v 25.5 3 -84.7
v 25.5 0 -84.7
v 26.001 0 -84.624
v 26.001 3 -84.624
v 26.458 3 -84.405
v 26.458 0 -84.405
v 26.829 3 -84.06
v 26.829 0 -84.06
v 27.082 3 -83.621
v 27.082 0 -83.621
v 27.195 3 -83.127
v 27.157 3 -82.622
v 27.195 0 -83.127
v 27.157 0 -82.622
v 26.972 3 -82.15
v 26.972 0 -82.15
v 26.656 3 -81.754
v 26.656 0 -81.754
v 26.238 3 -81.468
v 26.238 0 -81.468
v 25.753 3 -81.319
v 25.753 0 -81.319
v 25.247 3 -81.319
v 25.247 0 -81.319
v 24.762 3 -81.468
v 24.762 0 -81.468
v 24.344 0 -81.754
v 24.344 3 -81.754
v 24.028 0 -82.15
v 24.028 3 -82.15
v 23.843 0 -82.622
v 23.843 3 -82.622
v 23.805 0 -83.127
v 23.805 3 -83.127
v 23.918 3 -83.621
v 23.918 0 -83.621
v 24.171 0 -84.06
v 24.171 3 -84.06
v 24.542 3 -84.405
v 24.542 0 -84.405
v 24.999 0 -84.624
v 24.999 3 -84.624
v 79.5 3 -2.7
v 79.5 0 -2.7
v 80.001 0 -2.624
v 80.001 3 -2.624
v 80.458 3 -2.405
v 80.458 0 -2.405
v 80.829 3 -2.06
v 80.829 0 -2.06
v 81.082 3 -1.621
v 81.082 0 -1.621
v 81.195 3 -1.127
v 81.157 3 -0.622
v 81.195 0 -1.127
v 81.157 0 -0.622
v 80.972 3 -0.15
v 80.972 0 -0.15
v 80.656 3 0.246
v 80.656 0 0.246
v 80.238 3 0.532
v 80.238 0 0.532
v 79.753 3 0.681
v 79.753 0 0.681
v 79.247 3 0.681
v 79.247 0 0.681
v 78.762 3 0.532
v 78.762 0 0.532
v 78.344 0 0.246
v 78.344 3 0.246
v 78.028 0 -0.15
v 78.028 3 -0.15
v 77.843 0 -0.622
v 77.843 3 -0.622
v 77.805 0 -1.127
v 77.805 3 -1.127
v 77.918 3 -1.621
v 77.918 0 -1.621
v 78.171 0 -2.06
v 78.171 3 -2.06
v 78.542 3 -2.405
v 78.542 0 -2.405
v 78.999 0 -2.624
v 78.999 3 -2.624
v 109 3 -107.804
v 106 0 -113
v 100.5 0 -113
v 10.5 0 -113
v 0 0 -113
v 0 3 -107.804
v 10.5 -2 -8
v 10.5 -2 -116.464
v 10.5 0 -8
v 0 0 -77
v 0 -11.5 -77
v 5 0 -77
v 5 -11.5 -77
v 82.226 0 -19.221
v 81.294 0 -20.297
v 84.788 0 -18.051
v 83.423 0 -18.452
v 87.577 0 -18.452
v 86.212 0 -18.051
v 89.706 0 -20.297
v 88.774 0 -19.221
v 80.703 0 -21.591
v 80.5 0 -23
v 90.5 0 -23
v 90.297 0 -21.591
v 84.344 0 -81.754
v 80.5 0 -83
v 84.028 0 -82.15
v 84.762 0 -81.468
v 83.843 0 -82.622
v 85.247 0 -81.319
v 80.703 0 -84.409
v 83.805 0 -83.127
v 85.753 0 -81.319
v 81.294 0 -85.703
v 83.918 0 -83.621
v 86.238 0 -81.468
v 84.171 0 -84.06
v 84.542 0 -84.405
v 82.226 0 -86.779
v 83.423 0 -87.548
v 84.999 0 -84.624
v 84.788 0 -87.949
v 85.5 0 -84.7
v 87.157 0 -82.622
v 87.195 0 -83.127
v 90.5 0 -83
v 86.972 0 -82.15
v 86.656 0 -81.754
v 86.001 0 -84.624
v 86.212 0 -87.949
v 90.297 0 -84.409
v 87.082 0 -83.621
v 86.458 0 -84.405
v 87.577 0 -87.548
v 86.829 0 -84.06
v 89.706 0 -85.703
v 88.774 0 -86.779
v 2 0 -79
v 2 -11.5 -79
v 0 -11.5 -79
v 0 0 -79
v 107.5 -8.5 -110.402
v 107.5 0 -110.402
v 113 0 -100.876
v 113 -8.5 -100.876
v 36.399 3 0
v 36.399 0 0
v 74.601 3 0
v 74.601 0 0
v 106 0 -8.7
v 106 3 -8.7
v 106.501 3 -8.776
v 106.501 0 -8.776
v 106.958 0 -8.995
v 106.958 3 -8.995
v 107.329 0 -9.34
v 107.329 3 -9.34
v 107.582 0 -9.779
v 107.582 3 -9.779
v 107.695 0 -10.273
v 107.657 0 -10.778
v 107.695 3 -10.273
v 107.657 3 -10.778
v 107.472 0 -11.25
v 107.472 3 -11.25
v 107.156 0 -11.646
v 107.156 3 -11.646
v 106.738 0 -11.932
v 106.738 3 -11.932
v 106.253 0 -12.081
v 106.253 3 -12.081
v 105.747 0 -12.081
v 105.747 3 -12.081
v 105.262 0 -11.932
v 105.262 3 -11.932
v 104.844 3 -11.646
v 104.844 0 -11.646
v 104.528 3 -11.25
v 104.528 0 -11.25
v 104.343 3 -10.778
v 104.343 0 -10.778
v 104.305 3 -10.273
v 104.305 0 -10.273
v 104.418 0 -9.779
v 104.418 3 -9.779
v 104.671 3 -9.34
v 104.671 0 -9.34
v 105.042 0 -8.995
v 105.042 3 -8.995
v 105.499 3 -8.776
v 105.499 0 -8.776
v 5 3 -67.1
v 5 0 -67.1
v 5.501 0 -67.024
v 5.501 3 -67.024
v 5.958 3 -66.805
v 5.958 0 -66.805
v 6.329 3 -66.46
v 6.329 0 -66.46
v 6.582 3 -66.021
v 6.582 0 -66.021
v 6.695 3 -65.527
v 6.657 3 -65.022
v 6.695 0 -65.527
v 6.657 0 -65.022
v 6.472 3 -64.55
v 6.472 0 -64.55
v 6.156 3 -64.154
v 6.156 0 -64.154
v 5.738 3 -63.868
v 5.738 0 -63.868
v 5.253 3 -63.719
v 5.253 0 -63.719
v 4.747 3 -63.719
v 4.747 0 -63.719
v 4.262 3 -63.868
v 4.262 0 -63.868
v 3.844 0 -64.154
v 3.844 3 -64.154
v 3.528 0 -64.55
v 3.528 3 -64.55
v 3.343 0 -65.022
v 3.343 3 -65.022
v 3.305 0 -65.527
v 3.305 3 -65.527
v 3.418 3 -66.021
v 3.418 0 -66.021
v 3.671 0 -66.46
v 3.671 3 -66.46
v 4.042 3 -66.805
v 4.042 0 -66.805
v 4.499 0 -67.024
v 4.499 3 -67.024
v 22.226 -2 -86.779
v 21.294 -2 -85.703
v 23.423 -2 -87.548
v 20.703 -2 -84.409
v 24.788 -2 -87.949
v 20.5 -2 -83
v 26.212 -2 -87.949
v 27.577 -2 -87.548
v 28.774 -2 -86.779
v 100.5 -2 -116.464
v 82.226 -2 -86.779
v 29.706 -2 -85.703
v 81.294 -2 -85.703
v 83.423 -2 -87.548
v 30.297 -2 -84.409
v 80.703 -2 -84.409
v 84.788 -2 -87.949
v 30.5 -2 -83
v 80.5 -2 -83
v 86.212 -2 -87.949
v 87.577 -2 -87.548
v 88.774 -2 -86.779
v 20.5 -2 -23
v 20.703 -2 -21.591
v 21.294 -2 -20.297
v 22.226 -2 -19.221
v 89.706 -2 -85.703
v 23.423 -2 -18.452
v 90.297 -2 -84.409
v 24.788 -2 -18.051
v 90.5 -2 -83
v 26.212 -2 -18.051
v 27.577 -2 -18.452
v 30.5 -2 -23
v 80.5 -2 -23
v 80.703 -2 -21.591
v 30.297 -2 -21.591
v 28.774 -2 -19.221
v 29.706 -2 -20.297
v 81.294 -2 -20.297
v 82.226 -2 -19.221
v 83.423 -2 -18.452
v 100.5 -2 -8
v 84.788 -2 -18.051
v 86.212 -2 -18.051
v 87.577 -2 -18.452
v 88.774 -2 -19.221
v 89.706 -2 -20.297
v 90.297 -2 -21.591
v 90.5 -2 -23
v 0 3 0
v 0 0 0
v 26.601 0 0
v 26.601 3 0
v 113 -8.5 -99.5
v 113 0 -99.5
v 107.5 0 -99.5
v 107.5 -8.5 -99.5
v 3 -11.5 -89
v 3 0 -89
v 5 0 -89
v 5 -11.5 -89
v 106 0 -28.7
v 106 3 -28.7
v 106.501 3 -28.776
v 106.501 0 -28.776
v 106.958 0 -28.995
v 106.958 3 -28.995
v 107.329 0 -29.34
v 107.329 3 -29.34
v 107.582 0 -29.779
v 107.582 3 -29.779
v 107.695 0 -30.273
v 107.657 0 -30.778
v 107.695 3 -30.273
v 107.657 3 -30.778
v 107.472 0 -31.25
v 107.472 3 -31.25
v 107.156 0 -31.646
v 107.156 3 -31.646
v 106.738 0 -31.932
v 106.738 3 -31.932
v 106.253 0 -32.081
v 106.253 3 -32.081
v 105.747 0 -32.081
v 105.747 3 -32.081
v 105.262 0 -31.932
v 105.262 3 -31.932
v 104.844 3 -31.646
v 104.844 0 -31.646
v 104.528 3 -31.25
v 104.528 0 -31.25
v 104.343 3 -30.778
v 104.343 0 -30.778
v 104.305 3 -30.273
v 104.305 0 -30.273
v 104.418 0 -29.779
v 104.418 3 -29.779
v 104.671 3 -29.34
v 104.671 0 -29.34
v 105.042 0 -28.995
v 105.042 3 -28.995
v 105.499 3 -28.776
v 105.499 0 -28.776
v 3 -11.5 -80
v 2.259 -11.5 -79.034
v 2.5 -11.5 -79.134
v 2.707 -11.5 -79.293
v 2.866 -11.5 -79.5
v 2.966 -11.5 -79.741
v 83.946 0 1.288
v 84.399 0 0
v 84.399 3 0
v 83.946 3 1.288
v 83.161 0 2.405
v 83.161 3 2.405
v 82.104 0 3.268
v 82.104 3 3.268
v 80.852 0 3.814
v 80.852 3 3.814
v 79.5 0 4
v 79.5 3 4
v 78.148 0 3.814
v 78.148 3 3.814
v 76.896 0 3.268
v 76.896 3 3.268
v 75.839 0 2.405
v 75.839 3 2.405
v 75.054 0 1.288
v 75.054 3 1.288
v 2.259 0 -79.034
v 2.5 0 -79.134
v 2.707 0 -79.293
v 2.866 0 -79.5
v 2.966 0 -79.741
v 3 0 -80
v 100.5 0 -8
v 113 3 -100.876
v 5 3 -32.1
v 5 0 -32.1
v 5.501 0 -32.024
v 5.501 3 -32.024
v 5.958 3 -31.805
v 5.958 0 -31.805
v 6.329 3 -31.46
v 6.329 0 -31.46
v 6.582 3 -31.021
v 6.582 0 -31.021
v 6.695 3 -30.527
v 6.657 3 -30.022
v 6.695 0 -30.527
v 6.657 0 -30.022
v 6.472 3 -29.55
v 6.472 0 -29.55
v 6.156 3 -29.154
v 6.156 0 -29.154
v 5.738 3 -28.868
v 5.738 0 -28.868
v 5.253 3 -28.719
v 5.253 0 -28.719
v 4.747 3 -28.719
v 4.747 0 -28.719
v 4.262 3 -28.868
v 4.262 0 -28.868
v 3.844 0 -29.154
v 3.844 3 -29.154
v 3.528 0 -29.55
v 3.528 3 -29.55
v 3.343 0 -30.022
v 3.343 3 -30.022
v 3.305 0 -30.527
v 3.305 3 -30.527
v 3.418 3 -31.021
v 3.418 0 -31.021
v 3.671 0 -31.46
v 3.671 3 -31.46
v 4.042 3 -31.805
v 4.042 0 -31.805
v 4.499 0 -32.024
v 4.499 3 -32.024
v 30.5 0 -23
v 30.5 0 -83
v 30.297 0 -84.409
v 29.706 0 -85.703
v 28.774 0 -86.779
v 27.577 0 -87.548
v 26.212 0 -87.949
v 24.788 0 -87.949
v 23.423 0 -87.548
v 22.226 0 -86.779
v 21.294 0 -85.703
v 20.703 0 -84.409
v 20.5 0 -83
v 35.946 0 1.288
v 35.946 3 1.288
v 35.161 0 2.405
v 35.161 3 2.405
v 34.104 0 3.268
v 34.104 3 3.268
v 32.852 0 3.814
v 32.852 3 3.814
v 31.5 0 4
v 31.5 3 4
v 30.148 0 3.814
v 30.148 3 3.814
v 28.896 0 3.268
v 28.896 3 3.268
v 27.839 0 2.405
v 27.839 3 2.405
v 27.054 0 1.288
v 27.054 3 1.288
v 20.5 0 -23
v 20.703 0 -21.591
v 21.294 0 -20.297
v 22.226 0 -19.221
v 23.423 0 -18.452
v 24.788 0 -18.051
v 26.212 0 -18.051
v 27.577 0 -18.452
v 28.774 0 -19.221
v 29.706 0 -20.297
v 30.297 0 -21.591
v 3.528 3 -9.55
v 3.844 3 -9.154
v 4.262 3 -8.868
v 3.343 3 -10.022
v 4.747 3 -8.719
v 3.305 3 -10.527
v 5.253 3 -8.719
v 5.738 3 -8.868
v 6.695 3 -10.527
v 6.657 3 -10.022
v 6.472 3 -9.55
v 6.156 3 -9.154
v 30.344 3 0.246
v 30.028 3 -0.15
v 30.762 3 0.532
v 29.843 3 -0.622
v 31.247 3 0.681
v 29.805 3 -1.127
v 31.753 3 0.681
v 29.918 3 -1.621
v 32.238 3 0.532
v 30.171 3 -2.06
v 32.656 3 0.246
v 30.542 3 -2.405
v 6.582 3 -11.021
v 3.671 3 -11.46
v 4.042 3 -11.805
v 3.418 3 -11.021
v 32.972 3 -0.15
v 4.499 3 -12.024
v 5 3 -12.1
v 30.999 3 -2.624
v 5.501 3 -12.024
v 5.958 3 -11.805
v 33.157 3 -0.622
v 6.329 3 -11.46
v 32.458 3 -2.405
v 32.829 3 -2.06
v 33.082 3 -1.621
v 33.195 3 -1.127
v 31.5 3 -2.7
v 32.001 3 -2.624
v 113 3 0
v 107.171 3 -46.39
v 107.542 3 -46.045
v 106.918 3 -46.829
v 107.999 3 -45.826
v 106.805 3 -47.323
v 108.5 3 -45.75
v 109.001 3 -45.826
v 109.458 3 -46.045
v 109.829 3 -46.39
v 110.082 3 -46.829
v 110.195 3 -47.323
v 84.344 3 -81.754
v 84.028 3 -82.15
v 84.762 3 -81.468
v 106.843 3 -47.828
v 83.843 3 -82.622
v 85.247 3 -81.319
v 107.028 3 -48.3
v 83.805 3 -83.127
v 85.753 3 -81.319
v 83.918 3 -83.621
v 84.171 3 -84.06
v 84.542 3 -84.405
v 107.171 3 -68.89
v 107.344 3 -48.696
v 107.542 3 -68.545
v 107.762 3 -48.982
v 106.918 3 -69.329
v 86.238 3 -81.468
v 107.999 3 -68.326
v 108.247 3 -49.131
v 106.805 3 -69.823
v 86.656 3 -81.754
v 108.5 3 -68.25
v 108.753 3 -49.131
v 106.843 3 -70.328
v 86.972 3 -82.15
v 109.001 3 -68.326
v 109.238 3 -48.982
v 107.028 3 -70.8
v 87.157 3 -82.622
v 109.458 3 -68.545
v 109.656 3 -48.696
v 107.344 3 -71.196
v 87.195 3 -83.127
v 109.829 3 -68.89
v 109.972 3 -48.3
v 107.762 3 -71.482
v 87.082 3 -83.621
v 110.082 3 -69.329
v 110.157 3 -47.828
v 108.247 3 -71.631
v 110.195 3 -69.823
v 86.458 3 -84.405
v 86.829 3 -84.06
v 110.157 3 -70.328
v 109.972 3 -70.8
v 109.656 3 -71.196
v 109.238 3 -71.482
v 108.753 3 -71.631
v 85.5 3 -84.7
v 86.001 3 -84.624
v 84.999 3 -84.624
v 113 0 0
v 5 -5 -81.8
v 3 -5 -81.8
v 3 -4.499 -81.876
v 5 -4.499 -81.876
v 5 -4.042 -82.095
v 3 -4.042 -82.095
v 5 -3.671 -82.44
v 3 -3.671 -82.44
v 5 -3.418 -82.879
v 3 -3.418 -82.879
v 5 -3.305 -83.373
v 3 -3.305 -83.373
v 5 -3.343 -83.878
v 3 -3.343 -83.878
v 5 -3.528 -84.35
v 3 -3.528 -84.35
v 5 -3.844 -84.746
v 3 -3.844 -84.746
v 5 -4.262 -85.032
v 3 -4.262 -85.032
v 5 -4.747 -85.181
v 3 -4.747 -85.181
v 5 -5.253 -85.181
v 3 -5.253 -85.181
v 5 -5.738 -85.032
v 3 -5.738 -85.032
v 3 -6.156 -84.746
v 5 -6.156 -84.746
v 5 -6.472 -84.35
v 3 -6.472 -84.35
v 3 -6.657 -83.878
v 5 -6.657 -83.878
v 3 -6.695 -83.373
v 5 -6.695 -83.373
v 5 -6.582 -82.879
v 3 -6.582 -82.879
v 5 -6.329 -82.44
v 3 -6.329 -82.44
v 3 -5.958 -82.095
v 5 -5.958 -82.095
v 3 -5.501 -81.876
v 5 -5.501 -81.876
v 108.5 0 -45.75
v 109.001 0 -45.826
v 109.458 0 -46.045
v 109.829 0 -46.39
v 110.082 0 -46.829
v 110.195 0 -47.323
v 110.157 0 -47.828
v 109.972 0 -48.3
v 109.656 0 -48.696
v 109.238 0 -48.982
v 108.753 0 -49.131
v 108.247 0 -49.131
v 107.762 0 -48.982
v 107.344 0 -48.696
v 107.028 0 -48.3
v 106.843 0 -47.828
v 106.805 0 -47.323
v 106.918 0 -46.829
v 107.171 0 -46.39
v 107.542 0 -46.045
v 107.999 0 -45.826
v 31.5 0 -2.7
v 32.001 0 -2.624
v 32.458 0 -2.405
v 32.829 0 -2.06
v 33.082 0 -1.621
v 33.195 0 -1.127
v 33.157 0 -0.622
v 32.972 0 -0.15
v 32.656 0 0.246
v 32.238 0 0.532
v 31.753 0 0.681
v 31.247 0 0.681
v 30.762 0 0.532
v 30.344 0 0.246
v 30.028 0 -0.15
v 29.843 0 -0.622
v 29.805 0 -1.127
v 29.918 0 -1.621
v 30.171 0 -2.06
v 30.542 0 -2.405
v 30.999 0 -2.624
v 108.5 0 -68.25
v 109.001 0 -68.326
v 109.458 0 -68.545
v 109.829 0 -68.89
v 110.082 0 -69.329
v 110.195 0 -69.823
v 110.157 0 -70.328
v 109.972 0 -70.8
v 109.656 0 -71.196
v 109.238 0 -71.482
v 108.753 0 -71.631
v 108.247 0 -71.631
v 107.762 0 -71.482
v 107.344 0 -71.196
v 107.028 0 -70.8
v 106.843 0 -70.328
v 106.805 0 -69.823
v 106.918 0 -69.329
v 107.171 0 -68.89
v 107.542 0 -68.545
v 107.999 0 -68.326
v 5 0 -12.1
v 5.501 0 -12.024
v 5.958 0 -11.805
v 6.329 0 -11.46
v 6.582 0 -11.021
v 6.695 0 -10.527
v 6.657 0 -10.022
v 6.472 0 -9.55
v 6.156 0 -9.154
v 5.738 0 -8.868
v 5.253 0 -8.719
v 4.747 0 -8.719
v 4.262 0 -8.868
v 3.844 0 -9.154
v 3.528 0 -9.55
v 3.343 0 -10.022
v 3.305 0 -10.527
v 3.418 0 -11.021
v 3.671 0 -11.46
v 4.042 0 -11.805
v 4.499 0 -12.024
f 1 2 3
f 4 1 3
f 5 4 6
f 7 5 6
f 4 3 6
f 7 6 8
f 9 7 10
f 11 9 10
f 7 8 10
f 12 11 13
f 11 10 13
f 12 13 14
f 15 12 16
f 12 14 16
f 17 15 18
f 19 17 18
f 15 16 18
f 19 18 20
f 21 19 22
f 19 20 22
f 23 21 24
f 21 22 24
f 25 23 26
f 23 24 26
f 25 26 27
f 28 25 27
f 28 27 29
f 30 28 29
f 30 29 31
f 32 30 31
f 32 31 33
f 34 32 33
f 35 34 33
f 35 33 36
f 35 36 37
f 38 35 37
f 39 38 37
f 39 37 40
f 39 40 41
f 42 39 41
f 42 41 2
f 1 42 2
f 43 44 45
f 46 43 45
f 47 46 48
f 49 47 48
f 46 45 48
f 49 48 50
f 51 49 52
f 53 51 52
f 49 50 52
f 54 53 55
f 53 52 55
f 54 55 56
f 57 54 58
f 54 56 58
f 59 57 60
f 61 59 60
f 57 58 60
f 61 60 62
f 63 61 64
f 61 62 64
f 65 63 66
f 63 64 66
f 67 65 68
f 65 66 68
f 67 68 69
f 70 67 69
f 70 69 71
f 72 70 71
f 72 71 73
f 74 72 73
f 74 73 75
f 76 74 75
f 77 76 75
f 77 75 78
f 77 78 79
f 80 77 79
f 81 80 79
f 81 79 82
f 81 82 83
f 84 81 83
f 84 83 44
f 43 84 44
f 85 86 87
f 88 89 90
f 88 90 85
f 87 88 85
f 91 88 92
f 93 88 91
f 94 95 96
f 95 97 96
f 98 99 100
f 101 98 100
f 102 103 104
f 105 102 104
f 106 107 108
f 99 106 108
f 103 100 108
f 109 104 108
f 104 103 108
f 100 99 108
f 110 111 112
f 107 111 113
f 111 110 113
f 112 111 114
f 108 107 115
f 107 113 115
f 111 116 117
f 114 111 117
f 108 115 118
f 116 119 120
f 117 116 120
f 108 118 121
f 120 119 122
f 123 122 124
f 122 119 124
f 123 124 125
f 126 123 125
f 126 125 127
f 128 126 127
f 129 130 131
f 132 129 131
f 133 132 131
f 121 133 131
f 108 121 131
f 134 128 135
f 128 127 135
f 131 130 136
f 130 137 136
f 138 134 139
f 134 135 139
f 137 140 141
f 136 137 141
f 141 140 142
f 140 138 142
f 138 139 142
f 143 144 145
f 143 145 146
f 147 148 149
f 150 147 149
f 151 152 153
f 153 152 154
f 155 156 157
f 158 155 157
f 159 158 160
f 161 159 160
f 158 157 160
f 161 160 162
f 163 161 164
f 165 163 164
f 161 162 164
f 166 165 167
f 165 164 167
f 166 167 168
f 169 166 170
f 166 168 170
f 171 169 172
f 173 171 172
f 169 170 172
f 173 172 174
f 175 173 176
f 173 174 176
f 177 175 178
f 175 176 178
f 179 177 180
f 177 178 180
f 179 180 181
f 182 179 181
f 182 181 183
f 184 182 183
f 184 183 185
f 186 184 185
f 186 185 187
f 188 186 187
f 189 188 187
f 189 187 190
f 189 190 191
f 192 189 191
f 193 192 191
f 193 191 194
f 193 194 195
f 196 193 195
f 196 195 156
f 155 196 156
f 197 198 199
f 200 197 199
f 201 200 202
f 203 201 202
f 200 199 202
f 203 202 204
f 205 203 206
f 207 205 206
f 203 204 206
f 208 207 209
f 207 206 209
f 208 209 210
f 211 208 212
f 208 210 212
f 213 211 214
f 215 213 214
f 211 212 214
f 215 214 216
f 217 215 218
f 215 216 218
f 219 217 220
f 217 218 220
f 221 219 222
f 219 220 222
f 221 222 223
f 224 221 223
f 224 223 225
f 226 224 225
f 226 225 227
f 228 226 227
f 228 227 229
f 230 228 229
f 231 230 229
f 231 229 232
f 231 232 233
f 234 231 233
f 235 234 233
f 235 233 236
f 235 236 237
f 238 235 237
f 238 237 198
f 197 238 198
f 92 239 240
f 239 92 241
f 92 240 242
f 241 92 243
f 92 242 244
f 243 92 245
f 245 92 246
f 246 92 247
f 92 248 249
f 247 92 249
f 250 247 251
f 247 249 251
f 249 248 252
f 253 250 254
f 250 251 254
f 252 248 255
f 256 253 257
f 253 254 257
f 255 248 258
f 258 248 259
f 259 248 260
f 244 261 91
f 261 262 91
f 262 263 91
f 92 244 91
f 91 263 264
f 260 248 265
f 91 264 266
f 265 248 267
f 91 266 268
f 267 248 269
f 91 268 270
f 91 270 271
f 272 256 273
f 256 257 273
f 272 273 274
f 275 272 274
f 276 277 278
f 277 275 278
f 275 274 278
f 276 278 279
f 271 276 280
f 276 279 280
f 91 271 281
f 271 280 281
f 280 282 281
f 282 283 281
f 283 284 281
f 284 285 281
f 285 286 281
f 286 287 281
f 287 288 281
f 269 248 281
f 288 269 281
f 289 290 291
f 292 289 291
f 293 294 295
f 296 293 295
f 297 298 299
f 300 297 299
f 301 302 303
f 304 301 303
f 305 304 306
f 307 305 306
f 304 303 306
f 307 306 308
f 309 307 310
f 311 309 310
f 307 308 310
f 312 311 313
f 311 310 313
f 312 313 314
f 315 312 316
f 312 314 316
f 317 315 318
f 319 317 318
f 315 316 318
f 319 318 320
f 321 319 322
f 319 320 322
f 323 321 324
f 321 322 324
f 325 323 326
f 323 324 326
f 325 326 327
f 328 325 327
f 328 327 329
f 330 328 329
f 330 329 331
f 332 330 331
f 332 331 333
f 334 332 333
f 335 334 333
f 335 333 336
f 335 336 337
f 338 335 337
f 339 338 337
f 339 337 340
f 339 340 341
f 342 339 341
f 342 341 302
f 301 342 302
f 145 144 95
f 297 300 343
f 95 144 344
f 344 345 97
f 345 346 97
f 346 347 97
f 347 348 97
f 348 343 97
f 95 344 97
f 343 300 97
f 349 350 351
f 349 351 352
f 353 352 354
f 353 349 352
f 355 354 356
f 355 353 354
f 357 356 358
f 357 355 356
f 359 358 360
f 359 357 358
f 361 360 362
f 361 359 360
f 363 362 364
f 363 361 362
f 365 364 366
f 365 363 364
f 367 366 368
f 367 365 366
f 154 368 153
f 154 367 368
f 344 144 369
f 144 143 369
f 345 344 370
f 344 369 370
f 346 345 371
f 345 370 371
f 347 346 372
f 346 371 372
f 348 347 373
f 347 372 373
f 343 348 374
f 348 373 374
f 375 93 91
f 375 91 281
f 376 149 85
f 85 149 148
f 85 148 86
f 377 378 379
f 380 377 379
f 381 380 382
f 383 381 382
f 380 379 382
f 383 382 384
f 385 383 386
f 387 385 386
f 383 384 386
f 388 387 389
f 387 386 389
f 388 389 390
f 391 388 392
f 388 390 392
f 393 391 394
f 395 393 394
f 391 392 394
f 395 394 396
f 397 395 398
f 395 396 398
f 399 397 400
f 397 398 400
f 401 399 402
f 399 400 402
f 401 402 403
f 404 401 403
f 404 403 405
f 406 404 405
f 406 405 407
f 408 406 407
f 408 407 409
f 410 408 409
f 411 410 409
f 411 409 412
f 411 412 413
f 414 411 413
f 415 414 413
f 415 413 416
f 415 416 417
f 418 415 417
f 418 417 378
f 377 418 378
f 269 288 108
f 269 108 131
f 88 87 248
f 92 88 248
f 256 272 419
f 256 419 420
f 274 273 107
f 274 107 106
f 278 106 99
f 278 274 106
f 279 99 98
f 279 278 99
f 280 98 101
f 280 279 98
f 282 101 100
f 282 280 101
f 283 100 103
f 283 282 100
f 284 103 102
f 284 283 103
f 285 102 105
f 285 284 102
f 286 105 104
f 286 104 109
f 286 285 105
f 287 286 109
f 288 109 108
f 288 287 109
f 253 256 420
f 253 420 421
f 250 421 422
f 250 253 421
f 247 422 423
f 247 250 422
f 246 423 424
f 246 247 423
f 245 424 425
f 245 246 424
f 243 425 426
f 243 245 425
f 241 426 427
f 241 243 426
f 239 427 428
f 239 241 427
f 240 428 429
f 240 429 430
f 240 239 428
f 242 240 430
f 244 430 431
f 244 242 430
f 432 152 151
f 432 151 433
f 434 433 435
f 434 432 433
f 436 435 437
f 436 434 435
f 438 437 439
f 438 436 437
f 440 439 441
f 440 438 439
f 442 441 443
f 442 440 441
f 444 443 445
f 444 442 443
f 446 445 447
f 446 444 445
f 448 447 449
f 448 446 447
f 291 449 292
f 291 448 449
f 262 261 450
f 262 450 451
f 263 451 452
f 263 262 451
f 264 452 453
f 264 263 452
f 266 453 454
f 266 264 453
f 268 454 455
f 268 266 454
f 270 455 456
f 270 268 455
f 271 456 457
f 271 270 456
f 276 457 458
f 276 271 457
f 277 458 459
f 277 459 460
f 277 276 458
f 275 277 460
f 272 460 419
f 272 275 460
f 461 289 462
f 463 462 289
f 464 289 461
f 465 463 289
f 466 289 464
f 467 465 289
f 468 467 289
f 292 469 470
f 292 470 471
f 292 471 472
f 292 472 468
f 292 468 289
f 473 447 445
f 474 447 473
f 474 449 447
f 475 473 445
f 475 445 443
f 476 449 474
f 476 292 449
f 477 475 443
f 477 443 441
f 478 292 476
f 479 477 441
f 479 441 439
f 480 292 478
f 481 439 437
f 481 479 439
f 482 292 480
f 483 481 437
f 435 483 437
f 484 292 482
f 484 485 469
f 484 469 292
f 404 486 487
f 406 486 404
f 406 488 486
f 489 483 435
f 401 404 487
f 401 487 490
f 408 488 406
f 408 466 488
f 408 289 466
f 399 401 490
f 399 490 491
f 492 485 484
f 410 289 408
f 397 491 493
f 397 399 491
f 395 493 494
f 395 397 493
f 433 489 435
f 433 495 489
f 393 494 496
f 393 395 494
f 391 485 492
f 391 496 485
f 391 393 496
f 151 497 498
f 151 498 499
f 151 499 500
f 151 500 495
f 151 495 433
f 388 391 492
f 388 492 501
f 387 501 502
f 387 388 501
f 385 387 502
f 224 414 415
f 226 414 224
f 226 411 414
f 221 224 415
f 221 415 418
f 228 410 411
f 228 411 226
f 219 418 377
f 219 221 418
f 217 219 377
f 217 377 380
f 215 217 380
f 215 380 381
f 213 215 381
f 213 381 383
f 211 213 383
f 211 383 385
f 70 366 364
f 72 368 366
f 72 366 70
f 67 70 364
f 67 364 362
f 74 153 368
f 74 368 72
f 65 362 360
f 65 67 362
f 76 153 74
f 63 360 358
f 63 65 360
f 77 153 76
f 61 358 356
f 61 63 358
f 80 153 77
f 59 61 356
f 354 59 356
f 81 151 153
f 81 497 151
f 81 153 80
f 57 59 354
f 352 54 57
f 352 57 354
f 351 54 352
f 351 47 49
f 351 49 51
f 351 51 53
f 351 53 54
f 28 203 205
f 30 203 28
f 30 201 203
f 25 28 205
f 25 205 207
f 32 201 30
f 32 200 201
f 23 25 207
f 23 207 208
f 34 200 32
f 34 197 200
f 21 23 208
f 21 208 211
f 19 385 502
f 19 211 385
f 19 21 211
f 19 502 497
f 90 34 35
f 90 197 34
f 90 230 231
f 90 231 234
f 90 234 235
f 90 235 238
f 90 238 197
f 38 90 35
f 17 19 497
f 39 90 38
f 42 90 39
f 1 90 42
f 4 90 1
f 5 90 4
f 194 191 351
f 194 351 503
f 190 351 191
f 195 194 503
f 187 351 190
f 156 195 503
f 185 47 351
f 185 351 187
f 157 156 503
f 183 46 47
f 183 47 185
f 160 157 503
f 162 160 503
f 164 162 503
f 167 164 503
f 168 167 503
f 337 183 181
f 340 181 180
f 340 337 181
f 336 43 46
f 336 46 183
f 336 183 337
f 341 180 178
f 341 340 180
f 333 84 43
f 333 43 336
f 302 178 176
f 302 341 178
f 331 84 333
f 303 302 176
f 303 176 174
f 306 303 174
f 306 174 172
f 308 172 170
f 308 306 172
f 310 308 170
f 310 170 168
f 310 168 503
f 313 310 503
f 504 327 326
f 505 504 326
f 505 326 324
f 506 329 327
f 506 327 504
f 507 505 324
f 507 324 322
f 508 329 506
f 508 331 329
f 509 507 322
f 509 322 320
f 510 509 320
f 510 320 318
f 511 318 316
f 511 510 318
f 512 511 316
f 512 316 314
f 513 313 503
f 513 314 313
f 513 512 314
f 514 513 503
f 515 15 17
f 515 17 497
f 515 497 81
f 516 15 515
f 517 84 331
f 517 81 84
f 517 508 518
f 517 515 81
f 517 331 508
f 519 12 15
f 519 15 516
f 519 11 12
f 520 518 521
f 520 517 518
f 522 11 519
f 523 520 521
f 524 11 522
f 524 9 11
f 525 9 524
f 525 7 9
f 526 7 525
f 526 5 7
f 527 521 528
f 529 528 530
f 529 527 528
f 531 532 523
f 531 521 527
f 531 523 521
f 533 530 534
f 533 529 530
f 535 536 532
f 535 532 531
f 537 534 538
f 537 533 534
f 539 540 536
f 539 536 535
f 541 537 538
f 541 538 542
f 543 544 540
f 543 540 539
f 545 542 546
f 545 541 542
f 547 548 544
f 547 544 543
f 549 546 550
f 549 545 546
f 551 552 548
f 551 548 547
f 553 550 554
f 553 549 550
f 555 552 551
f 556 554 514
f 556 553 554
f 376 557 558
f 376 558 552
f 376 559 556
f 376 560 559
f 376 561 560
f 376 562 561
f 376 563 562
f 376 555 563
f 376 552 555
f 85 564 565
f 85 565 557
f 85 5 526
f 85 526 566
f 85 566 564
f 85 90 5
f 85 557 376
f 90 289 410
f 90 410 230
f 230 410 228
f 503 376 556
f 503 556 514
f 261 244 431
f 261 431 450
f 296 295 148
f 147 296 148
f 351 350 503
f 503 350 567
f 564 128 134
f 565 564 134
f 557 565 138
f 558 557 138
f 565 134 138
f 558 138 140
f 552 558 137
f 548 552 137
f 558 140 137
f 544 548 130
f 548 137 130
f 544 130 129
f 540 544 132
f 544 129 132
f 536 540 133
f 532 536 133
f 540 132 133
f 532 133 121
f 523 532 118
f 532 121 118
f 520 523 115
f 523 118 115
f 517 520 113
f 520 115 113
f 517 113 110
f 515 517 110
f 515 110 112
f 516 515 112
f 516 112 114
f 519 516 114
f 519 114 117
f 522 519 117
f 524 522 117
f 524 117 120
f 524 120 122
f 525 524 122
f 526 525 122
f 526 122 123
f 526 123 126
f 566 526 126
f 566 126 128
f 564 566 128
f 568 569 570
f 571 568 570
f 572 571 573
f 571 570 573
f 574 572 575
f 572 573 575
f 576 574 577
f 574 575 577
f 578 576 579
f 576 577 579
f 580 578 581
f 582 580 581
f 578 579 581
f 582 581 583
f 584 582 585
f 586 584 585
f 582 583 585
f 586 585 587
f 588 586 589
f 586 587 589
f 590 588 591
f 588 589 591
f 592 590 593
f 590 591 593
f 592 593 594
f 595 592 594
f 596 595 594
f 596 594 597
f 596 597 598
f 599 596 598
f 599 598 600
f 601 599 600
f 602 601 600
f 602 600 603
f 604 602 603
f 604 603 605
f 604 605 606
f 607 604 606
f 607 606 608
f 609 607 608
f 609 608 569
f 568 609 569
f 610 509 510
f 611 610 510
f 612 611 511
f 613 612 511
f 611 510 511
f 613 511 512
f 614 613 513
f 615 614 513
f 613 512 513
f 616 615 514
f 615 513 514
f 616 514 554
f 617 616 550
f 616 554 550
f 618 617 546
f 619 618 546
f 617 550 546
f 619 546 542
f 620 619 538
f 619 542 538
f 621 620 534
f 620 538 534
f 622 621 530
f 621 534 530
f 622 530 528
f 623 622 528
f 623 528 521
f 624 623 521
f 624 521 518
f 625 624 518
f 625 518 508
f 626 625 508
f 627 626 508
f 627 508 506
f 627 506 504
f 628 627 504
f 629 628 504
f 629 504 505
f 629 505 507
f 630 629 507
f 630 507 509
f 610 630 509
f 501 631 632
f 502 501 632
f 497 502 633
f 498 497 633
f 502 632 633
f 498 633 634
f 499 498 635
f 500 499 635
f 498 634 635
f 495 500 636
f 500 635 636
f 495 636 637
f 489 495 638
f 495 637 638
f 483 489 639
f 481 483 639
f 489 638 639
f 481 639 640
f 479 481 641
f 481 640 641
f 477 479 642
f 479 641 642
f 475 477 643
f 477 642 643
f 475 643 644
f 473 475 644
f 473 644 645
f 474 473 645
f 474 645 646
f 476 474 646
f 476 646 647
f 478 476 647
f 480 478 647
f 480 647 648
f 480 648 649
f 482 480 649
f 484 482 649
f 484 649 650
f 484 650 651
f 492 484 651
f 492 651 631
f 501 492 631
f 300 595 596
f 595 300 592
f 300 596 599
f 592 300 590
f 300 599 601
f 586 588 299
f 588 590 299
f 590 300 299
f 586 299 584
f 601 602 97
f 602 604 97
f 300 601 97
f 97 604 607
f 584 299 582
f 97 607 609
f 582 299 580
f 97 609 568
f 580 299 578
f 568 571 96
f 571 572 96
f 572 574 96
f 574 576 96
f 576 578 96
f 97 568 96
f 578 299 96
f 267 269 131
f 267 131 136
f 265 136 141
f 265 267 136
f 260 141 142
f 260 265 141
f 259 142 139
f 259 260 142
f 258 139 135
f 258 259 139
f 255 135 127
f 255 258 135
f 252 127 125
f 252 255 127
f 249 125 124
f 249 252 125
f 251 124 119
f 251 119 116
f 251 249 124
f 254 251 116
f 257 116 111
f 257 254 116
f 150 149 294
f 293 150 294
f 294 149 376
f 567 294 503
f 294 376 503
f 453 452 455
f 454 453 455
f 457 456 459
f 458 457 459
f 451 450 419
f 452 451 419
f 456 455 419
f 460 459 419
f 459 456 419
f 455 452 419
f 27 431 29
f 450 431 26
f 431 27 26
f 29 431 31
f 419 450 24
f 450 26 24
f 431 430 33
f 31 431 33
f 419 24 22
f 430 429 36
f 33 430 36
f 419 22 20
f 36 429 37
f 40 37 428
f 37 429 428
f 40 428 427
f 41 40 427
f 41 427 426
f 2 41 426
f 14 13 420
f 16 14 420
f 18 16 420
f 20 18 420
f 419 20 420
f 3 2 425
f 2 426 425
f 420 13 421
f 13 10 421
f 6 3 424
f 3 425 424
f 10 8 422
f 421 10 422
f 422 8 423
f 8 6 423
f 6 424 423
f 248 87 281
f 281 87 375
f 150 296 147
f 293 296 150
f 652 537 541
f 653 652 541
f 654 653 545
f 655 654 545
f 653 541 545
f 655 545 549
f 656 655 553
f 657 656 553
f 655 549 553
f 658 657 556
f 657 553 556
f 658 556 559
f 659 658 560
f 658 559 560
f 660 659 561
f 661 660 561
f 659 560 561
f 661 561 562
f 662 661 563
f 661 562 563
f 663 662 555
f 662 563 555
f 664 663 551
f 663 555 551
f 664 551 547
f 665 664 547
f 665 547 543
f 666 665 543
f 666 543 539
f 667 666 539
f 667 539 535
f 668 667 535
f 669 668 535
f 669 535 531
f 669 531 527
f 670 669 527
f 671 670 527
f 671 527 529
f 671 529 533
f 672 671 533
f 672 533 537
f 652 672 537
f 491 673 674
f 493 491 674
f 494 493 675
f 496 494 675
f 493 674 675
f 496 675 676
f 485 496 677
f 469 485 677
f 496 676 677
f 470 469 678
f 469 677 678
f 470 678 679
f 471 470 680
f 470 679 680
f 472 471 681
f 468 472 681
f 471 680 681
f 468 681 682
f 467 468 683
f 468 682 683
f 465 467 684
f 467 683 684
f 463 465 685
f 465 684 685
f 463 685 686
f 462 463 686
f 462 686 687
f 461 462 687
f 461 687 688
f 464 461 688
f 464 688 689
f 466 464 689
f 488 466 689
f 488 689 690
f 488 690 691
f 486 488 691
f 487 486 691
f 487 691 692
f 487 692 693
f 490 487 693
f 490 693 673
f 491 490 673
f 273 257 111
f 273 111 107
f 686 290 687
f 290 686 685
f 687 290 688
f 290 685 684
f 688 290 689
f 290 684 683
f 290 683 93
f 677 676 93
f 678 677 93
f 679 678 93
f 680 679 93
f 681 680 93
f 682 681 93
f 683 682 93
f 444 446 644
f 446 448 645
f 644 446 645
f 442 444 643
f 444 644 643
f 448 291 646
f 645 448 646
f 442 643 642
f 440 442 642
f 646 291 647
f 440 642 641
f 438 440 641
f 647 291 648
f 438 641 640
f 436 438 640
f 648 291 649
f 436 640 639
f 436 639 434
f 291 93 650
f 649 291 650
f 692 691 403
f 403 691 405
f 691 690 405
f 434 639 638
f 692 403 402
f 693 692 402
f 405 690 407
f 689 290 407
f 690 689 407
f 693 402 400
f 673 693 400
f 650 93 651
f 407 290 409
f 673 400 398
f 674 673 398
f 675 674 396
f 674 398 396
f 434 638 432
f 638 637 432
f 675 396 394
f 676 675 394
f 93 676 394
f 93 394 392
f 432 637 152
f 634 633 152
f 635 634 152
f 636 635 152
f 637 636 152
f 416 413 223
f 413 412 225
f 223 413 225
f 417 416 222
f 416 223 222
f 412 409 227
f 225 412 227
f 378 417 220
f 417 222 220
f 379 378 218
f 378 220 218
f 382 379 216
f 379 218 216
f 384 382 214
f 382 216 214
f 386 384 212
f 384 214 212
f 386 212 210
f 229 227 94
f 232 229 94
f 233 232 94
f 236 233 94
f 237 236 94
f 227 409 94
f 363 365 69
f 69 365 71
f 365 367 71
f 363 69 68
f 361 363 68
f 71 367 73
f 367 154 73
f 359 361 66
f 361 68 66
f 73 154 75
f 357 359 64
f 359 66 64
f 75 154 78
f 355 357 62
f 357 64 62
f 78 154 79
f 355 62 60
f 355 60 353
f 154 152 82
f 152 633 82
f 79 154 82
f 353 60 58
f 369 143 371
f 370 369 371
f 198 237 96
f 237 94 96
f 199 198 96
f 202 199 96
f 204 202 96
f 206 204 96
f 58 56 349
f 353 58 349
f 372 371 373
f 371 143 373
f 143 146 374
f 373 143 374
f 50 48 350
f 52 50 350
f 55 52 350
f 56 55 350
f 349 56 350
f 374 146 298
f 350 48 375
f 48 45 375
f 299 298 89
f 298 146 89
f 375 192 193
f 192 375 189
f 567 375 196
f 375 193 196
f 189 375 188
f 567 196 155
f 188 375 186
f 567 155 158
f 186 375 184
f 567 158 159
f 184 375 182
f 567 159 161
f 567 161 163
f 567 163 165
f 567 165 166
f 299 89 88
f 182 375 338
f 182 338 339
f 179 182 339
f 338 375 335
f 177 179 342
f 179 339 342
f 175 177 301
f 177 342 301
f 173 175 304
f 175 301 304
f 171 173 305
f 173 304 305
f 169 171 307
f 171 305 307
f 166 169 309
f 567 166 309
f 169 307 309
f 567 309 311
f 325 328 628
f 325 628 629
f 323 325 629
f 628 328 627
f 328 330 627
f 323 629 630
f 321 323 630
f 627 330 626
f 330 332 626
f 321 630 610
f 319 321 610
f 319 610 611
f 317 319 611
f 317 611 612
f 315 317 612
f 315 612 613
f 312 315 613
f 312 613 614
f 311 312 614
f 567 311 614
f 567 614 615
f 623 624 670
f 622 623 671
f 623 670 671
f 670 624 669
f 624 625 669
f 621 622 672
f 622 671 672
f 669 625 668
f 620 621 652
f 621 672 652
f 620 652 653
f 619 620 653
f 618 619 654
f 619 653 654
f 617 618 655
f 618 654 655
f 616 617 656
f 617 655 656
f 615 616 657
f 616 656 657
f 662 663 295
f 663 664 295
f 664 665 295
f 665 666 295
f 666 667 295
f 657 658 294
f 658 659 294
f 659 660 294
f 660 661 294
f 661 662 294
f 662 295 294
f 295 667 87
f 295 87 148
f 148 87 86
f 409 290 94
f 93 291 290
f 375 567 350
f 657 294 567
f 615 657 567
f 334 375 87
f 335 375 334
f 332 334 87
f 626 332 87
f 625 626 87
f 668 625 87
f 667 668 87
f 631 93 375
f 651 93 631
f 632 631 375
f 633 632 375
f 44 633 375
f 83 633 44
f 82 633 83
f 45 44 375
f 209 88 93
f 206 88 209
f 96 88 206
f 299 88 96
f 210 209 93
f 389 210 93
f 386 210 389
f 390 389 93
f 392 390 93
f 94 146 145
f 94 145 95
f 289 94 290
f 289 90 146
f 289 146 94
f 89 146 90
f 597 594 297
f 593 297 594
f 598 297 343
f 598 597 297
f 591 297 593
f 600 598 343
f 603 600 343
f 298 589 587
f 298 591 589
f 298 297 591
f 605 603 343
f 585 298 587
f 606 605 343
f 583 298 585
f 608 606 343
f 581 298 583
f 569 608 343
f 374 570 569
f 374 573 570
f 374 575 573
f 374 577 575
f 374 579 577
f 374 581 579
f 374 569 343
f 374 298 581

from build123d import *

# Parameters (mm, degrees)
SKETCH_1_W          = 113
SKETCH_1_H          = 113
EXTRUDE_1_DEPTH     = 3
CUT_EXTRUDE_1_REACH = 161.834
SKETCH_2_R          = 1.7
SKETCH_3_W          = 90
SKETCH_3_H          = 105
EXTRUDE_2_DEPTH     = 2
SKETCH_5_R          = 5
EXTRUDE_3_DEPTH     = 3
CUT_EXTRUDE_2_REACH = 161.834
SKETCH_6_R          = 1.7
CUT_EXTRUDE_3_REACH = 161.834
SKETCH_7_R          = 1.7
CUT_EXTRUDE_4_REACH = 161.884
SKETCH_8_R          = 1.7
EXTRUDE_5_DEPTH     = 90
CUT_EXTRUDE_5_DEPTH = 2
SKETCH_13_W         = 2
SKETCH_13_H         = 12
EXTRUDE_6_DEPTH     = 11.5
CUT_EXTRUDE_6_REACH = 162.612
SKETCH_14_R         = 1.7
CUT_EXTRUDE_7_REACH = 164.681
EXTRUDE_7_DEPTH     = 8.5
SKETCH_17_W         = 2
SKETCH_17_H         = 11.5
EXTRUDE_8_DEPTH     = 3
FILLET_1_R          = 1
CUT_EXTRUDE_8_DEPTH = 163.681089759


with BuildPart() as part:
    # 草图1 → 凸台-拉伸1 (new body)
    with BuildSketch(Plane(origin=(0, 0, 0), x_dir=(1, 0, 0), z_dir=(0, 1, 0))):
        with Locations((56.5, 56.5)):
            Rectangle(SKETCH_1_W, SKETCH_1_H)
    extrude(amount=EXTRUDE_1_DEPTH)

    # 草图2 → 切除-拉伸1 (cut, up to next)
    with BuildSketch(Plane(origin=(0, 3, 0), x_dir=(1, 0, 0), z_dir=(0, 1, 0)), mode=Mode.PRIVATE) as cut_extrude_1_sk1:
        with Locations(Location((108.5, 69.95, 0), (0, 0, 270))):
            Circle(SKETCH_2_R)
    cut_extrude_1_tool1 = extrude(cut_extrude_1_sk1.sketch, amount=-CUT_EXTRUDE_1_REACH, mode=Mode.PRIVATE) & part.part
    # 草图2 → 切除-拉伸1 (cut, up to next)
    with BuildSketch(Plane(origin=(0, 3, 0), x_dir=(1, 0, 0), z_dir=(0, 1, 0)), mode=Mode.PRIVATE) as cut_extrude_1_sk2:
        with Locations(Location((108.5, 47.45, 0), (0, 0, 270))):
            Circle(SKETCH_2_R)
    cut_extrude_1_tool2 = extrude(cut_extrude_1_sk2.sketch, amount=-CUT_EXTRUDE_1_REACH, mode=Mode.PRIVATE) & part.part
    # 草图2 → 切除-拉伸1 (cut, up to next)
    with BuildSketch(Plane(origin=(0, 3, 0), x_dir=(1, 0, 0), z_dir=(0, 1, 0)), mode=Mode.PRIVATE) as cut_extrude_1_sk3:
        with Locations(Location((106, 30.4, 0), (0, 0, 270))):
            Circle(SKETCH_2_R)
    cut_extrude_1_tool3 = extrude(cut_extrude_1_sk3.sketch, amount=-CUT_EXTRUDE_1_REACH, mode=Mode.PRIVATE) & part.part
    # 草图2 → 切除-拉伸1 (cut, up to next)
    with BuildSketch(Plane(origin=(0, 3, 0), x_dir=(1, 0, 0), z_dir=(0, 1, 0)), mode=Mode.PRIVATE) as cut_extrude_1_sk4:
        with Locations(Location((106, 10.4, 0), (0, 0, 270))):
            Circle(SKETCH_2_R)
    cut_extrude_1_tool4 = extrude(cut_extrude_1_sk4.sketch, amount=-CUT_EXTRUDE_1_REACH, mode=Mode.PRIVATE) & part.part
    add(cut_extrude_1_tool1.solids().sort_by_distance((108.5, 3, -69.95))[0], mode=Mode.SUBTRACT)
    add(cut_extrude_1_tool2.solids().sort_by_distance((108.5, 3, -47.45))[0], mode=Mode.SUBTRACT)
    add(cut_extrude_1_tool3.solids().sort_by_distance((106, 3, -30.4))[0], mode=Mode.SUBTRACT)
    add(cut_extrude_1_tool4.solids().sort_by_distance((106, 3, -10.4))[0], mode=Mode.SUBTRACT)

    # 草图3 → 凸台-拉伸2 (add)
    with BuildSketch(Plane(origin=(0, 0, 0), x_dir=(1, 0, 0), z_dir=(0, 1, 0))):
        with Locations((55.5, 60.5)):
            Rectangle(SKETCH_3_W, SKETCH_3_H)
    extrude(amount=-EXTRUDE_2_DEPTH)

    # 草图5 → 凸台-拉伸3 (add)
    with BuildSketch(Plane.XZ):
        with Locations((79.5, -1)):
            Circle(SKETCH_5_R)
        with Locations((31.5, -1)):
            Circle(SKETCH_5_R)
    extrude(amount=-EXTRUDE_3_DEPTH)

    # 草图6 → 切除-拉伸2 (cut, up to next)
    with BuildSketch(Plane.XZ, mode=Mode.PRIVATE) as cut_extrude_2_sk1:
        with Locations(Location((31.5, -1, 0), (0, 0, 270))):
            Circle(SKETCH_6_R)
    cut_extrude_2_tool1 = extrude(cut_extrude_2_sk1.sketch, amount=-CUT_EXTRUDE_2_REACH, mode=Mode.PRIVATE) & part.part
    # 草图6 → 切除-拉伸2 (cut, up to next)
    with BuildSketch(Plane.XZ, mode=Mode.PRIVATE) as cut_extrude_2_sk2:
        with Locations(Location((79.5, -1, 0), (0, 0, 270))):
            Circle(SKETCH_6_R)
    cut_extrude_2_tool2 = extrude(cut_extrude_2_sk2.sketch, amount=-CUT_EXTRUDE_2_REACH, mode=Mode.PRIVATE) & part.part
    add(cut_extrude_2_tool1.solids().sort_by_distance((31.5, 0, -1))[0], mode=Mode.SUBTRACT)
    add(cut_extrude_2_tool2.solids().sort_by_distance((79.5, 0, -1))[0], mode=Mode.SUBTRACT)

    # 草图7 → 切除-拉伸3 (cut, up to next)
    with BuildSketch(Plane.XZ, mode=Mode.PRIVATE) as cut_extrude_3_sk1:
        with Locations(Location((5, -10.4, 0), (0, 0, 270))):
            Circle(SKETCH_7_R)
    cut_extrude_3_tool1 = extrude(cut_extrude_3_sk1.sketch, amount=-CUT_EXTRUDE_3_REACH, mode=Mode.PRIVATE) & part.part
    # 草图7 → 切除-拉伸3 (cut, up to next)
    with BuildSketch(Plane.XZ, mode=Mode.PRIVATE) as cut_extrude_3_sk2:
        with Locations(Location((5, -30.4, 0), (0, 0, 270))):
            Circle(SKETCH_7_R)
    cut_extrude_3_tool2 = extrude(cut_extrude_3_sk2.sketch, amount=-CUT_EXTRUDE_3_REACH, mode=Mode.PRIVATE) & part.part
    # 草图7 → 切除-拉伸3 (cut, up to next)
    with BuildSketch(Plane.XZ, mode=Mode.PRIVATE) as cut_extrude_3_sk3:
        with Locations(Location((5, -65.4, 0), (0, 0, 270))):
            Circle(SKETCH_7_R)
    cut_extrude_3_tool3 = extrude(cut_extrude_3_sk3.sketch, amount=-CUT_EXTRUDE_3_REACH, mode=Mode.PRIVATE) & part.part
    add(cut_extrude_3_tool1.solids().sort_by_distance((5, 0, -10.4))[0], mode=Mode.SUBTRACT)
    add(cut_extrude_3_tool2.solids().sort_by_distance((5, 0, -30.4))[0], mode=Mode.SUBTRACT)
    add(cut_extrude_3_tool3.solids().sort_by_distance((5, 0, -65.4))[0], mode=Mode.SUBTRACT)

    # 草图8 → 切除-拉伸4 (cut, up to next)
    with BuildSketch(Plane.XZ.offset(2), mode=Mode.PRIVATE) as cut_extrude_4_sk1:
        with Locations(Location((25.5, -83, 0), (0, 0, 270))):
            Circle(SKETCH_8_R)
    cut_extrude_4_tool1 = extrude(cut_extrude_4_sk1.sketch, amount=-CUT_EXTRUDE_4_REACH, mode=Mode.PRIVATE) & part.part
    # 草图8 → 切除-拉伸4 (cut, up to next)
    with BuildSketch(Plane.XZ.offset(2), mode=Mode.PRIVATE) as cut_extrude_4_sk2:
        with Locations(Location((85.5, -83, 0), (0, 0, 270))):
            Circle(SKETCH_8_R)
    cut_extrude_4_tool2 = extrude(cut_extrude_4_sk2.sketch, amount=-CUT_EXTRUDE_4_REACH, mode=Mode.PRIVATE) & part.part
    add(cut_extrude_4_tool1.solids().sort_by_distance((25.5, -2, -83))[0], mode=Mode.SUBTRACT)
    add(cut_extrude_4_tool2.solids().sort_by_distance((85.5, -2, -83))[0], mode=Mode.SUBTRACT)

    # 草图10 → 凸台-拉伸5 (add)
    with BuildSketch(Plane(origin=(100.5, 0, 0), x_dir=(0, 0, -1), z_dir=(1, 0, 0))):
        Polygon((113, 0), (116.464101615, -2), (113, -2), align=None)
    extrude(amount=-EXTRUDE_5_DEPTH)

    # 草图11 → 切除-拉伸5 (cut)
    with BuildSketch(Plane(origin=(0, -2, 0), x_dir=(1, 0, 0), z_dir=(0, 1, 0))):
        with BuildLine():
            Line((20.5, 83), (20.5, 23))
            ThreePointArc((20.5, 23), (25.5, 18), (30.5, 23))
            Line((30.5, 23), (30.5, 83))
            ThreePointArc((30.5, 83), (25.5, 88), (20.5, 83))
        make_face()
        with BuildLine():
            Line((80.5, 83), (80.5, 23))
            ThreePointArc((80.5, 23), (85.5, 18), (90.5, 23))
            Line((90.5, 23), (90.5, 83))
            ThreePointArc((90.5, 83), (85.5, 88), (80.5, 83))
        make_face()
    extrude(amount=CUT_EXTRUDE_5_DEPTH, mode=Mode.SUBTRACT)

    # 草图13 → 凸台-拉伸6 (add)
    with BuildSketch(Plane.XZ):
        with Locations((4, -83)):
            Rectangle(SKETCH_13_W, SKETCH_13_H)
    extrude(amount=EXTRUDE_6_DEPTH)

    # 草图14 → 切除-拉伸6 (cut, up to next)
    with BuildSketch(Plane.ZY.offset(-3), mode=Mode.PRIVATE) as cut_extrude_6_sk1:
        with Locations((-83.5, -5)):
            Circle(SKETCH_14_R)
    cut_extrude_6_tool1 = extrude(cut_extrude_6_sk1.sketch, amount=-CUT_EXTRUDE_6_REACH, mode=Mode.PRIVATE) & part.part
    add(cut_extrude_6_tool1.solids().sort_by_distance((3, -5, -83.5))[0], mode=Mode.SUBTRACT)

    # 草图15 → 切除-拉伸7 (cut, up to next)
    with BuildSketch(Plane.XZ, mode=Mode.PRIVATE) as cut_extrude_7_sk1:
        Polygon((113, -100.875644347), (106, -113), (113, -113), align=None)
    cut_extrude_7_tool1 = extrude(cut_extrude_7_sk1.sketch, amount=-CUT_EXTRUDE_7_REACH, mode=Mode.PRIVATE) & part.part
    add(cut_extrude_7_tool1.solids().sort_by_distance((110.666667, 0, -108.958548))[0], mode=Mode.SUBTRACT)

    # 草图16 → 凸台-拉伸7 (add)
    with BuildSketch(Plane.XZ):
        Polygon((113, -99.5), (107.5, -99.5), (107.5, -110.401923789), (113, -100.875644347), align=None)
    extrude(amount=EXTRUDE_7_DEPTH)

    # 草图17 → 凸台-拉伸8 (add)
    with BuildSketch(Plane.ZY.offset(-3)):
        with Locations((-78, -5.75)):
            Rectangle(SKETCH_17_W, SKETCH_17_H)
    extrude(amount=EXTRUDE_8_DEPTH)

    # 圆角1
    fillet_1_edges = [part.edges().sort_by_distance(p)[0] for p in [
        (3, -5.75, -79),
    ]]
    fillet(fillet_1_edges, radius=FILLET_1_R)

    # 草图19 → 切除-拉伸8 (cut, through all)
    with BuildSketch(Plane.ZY):
        Polygon((-113, 0), (-107.803847577, 3), (-113, 3), align=None)
    extrude(amount=-CUT_EXTRUDE_8_DEPTH, mode=Mode.SUBTRACT)


solid = part.part
